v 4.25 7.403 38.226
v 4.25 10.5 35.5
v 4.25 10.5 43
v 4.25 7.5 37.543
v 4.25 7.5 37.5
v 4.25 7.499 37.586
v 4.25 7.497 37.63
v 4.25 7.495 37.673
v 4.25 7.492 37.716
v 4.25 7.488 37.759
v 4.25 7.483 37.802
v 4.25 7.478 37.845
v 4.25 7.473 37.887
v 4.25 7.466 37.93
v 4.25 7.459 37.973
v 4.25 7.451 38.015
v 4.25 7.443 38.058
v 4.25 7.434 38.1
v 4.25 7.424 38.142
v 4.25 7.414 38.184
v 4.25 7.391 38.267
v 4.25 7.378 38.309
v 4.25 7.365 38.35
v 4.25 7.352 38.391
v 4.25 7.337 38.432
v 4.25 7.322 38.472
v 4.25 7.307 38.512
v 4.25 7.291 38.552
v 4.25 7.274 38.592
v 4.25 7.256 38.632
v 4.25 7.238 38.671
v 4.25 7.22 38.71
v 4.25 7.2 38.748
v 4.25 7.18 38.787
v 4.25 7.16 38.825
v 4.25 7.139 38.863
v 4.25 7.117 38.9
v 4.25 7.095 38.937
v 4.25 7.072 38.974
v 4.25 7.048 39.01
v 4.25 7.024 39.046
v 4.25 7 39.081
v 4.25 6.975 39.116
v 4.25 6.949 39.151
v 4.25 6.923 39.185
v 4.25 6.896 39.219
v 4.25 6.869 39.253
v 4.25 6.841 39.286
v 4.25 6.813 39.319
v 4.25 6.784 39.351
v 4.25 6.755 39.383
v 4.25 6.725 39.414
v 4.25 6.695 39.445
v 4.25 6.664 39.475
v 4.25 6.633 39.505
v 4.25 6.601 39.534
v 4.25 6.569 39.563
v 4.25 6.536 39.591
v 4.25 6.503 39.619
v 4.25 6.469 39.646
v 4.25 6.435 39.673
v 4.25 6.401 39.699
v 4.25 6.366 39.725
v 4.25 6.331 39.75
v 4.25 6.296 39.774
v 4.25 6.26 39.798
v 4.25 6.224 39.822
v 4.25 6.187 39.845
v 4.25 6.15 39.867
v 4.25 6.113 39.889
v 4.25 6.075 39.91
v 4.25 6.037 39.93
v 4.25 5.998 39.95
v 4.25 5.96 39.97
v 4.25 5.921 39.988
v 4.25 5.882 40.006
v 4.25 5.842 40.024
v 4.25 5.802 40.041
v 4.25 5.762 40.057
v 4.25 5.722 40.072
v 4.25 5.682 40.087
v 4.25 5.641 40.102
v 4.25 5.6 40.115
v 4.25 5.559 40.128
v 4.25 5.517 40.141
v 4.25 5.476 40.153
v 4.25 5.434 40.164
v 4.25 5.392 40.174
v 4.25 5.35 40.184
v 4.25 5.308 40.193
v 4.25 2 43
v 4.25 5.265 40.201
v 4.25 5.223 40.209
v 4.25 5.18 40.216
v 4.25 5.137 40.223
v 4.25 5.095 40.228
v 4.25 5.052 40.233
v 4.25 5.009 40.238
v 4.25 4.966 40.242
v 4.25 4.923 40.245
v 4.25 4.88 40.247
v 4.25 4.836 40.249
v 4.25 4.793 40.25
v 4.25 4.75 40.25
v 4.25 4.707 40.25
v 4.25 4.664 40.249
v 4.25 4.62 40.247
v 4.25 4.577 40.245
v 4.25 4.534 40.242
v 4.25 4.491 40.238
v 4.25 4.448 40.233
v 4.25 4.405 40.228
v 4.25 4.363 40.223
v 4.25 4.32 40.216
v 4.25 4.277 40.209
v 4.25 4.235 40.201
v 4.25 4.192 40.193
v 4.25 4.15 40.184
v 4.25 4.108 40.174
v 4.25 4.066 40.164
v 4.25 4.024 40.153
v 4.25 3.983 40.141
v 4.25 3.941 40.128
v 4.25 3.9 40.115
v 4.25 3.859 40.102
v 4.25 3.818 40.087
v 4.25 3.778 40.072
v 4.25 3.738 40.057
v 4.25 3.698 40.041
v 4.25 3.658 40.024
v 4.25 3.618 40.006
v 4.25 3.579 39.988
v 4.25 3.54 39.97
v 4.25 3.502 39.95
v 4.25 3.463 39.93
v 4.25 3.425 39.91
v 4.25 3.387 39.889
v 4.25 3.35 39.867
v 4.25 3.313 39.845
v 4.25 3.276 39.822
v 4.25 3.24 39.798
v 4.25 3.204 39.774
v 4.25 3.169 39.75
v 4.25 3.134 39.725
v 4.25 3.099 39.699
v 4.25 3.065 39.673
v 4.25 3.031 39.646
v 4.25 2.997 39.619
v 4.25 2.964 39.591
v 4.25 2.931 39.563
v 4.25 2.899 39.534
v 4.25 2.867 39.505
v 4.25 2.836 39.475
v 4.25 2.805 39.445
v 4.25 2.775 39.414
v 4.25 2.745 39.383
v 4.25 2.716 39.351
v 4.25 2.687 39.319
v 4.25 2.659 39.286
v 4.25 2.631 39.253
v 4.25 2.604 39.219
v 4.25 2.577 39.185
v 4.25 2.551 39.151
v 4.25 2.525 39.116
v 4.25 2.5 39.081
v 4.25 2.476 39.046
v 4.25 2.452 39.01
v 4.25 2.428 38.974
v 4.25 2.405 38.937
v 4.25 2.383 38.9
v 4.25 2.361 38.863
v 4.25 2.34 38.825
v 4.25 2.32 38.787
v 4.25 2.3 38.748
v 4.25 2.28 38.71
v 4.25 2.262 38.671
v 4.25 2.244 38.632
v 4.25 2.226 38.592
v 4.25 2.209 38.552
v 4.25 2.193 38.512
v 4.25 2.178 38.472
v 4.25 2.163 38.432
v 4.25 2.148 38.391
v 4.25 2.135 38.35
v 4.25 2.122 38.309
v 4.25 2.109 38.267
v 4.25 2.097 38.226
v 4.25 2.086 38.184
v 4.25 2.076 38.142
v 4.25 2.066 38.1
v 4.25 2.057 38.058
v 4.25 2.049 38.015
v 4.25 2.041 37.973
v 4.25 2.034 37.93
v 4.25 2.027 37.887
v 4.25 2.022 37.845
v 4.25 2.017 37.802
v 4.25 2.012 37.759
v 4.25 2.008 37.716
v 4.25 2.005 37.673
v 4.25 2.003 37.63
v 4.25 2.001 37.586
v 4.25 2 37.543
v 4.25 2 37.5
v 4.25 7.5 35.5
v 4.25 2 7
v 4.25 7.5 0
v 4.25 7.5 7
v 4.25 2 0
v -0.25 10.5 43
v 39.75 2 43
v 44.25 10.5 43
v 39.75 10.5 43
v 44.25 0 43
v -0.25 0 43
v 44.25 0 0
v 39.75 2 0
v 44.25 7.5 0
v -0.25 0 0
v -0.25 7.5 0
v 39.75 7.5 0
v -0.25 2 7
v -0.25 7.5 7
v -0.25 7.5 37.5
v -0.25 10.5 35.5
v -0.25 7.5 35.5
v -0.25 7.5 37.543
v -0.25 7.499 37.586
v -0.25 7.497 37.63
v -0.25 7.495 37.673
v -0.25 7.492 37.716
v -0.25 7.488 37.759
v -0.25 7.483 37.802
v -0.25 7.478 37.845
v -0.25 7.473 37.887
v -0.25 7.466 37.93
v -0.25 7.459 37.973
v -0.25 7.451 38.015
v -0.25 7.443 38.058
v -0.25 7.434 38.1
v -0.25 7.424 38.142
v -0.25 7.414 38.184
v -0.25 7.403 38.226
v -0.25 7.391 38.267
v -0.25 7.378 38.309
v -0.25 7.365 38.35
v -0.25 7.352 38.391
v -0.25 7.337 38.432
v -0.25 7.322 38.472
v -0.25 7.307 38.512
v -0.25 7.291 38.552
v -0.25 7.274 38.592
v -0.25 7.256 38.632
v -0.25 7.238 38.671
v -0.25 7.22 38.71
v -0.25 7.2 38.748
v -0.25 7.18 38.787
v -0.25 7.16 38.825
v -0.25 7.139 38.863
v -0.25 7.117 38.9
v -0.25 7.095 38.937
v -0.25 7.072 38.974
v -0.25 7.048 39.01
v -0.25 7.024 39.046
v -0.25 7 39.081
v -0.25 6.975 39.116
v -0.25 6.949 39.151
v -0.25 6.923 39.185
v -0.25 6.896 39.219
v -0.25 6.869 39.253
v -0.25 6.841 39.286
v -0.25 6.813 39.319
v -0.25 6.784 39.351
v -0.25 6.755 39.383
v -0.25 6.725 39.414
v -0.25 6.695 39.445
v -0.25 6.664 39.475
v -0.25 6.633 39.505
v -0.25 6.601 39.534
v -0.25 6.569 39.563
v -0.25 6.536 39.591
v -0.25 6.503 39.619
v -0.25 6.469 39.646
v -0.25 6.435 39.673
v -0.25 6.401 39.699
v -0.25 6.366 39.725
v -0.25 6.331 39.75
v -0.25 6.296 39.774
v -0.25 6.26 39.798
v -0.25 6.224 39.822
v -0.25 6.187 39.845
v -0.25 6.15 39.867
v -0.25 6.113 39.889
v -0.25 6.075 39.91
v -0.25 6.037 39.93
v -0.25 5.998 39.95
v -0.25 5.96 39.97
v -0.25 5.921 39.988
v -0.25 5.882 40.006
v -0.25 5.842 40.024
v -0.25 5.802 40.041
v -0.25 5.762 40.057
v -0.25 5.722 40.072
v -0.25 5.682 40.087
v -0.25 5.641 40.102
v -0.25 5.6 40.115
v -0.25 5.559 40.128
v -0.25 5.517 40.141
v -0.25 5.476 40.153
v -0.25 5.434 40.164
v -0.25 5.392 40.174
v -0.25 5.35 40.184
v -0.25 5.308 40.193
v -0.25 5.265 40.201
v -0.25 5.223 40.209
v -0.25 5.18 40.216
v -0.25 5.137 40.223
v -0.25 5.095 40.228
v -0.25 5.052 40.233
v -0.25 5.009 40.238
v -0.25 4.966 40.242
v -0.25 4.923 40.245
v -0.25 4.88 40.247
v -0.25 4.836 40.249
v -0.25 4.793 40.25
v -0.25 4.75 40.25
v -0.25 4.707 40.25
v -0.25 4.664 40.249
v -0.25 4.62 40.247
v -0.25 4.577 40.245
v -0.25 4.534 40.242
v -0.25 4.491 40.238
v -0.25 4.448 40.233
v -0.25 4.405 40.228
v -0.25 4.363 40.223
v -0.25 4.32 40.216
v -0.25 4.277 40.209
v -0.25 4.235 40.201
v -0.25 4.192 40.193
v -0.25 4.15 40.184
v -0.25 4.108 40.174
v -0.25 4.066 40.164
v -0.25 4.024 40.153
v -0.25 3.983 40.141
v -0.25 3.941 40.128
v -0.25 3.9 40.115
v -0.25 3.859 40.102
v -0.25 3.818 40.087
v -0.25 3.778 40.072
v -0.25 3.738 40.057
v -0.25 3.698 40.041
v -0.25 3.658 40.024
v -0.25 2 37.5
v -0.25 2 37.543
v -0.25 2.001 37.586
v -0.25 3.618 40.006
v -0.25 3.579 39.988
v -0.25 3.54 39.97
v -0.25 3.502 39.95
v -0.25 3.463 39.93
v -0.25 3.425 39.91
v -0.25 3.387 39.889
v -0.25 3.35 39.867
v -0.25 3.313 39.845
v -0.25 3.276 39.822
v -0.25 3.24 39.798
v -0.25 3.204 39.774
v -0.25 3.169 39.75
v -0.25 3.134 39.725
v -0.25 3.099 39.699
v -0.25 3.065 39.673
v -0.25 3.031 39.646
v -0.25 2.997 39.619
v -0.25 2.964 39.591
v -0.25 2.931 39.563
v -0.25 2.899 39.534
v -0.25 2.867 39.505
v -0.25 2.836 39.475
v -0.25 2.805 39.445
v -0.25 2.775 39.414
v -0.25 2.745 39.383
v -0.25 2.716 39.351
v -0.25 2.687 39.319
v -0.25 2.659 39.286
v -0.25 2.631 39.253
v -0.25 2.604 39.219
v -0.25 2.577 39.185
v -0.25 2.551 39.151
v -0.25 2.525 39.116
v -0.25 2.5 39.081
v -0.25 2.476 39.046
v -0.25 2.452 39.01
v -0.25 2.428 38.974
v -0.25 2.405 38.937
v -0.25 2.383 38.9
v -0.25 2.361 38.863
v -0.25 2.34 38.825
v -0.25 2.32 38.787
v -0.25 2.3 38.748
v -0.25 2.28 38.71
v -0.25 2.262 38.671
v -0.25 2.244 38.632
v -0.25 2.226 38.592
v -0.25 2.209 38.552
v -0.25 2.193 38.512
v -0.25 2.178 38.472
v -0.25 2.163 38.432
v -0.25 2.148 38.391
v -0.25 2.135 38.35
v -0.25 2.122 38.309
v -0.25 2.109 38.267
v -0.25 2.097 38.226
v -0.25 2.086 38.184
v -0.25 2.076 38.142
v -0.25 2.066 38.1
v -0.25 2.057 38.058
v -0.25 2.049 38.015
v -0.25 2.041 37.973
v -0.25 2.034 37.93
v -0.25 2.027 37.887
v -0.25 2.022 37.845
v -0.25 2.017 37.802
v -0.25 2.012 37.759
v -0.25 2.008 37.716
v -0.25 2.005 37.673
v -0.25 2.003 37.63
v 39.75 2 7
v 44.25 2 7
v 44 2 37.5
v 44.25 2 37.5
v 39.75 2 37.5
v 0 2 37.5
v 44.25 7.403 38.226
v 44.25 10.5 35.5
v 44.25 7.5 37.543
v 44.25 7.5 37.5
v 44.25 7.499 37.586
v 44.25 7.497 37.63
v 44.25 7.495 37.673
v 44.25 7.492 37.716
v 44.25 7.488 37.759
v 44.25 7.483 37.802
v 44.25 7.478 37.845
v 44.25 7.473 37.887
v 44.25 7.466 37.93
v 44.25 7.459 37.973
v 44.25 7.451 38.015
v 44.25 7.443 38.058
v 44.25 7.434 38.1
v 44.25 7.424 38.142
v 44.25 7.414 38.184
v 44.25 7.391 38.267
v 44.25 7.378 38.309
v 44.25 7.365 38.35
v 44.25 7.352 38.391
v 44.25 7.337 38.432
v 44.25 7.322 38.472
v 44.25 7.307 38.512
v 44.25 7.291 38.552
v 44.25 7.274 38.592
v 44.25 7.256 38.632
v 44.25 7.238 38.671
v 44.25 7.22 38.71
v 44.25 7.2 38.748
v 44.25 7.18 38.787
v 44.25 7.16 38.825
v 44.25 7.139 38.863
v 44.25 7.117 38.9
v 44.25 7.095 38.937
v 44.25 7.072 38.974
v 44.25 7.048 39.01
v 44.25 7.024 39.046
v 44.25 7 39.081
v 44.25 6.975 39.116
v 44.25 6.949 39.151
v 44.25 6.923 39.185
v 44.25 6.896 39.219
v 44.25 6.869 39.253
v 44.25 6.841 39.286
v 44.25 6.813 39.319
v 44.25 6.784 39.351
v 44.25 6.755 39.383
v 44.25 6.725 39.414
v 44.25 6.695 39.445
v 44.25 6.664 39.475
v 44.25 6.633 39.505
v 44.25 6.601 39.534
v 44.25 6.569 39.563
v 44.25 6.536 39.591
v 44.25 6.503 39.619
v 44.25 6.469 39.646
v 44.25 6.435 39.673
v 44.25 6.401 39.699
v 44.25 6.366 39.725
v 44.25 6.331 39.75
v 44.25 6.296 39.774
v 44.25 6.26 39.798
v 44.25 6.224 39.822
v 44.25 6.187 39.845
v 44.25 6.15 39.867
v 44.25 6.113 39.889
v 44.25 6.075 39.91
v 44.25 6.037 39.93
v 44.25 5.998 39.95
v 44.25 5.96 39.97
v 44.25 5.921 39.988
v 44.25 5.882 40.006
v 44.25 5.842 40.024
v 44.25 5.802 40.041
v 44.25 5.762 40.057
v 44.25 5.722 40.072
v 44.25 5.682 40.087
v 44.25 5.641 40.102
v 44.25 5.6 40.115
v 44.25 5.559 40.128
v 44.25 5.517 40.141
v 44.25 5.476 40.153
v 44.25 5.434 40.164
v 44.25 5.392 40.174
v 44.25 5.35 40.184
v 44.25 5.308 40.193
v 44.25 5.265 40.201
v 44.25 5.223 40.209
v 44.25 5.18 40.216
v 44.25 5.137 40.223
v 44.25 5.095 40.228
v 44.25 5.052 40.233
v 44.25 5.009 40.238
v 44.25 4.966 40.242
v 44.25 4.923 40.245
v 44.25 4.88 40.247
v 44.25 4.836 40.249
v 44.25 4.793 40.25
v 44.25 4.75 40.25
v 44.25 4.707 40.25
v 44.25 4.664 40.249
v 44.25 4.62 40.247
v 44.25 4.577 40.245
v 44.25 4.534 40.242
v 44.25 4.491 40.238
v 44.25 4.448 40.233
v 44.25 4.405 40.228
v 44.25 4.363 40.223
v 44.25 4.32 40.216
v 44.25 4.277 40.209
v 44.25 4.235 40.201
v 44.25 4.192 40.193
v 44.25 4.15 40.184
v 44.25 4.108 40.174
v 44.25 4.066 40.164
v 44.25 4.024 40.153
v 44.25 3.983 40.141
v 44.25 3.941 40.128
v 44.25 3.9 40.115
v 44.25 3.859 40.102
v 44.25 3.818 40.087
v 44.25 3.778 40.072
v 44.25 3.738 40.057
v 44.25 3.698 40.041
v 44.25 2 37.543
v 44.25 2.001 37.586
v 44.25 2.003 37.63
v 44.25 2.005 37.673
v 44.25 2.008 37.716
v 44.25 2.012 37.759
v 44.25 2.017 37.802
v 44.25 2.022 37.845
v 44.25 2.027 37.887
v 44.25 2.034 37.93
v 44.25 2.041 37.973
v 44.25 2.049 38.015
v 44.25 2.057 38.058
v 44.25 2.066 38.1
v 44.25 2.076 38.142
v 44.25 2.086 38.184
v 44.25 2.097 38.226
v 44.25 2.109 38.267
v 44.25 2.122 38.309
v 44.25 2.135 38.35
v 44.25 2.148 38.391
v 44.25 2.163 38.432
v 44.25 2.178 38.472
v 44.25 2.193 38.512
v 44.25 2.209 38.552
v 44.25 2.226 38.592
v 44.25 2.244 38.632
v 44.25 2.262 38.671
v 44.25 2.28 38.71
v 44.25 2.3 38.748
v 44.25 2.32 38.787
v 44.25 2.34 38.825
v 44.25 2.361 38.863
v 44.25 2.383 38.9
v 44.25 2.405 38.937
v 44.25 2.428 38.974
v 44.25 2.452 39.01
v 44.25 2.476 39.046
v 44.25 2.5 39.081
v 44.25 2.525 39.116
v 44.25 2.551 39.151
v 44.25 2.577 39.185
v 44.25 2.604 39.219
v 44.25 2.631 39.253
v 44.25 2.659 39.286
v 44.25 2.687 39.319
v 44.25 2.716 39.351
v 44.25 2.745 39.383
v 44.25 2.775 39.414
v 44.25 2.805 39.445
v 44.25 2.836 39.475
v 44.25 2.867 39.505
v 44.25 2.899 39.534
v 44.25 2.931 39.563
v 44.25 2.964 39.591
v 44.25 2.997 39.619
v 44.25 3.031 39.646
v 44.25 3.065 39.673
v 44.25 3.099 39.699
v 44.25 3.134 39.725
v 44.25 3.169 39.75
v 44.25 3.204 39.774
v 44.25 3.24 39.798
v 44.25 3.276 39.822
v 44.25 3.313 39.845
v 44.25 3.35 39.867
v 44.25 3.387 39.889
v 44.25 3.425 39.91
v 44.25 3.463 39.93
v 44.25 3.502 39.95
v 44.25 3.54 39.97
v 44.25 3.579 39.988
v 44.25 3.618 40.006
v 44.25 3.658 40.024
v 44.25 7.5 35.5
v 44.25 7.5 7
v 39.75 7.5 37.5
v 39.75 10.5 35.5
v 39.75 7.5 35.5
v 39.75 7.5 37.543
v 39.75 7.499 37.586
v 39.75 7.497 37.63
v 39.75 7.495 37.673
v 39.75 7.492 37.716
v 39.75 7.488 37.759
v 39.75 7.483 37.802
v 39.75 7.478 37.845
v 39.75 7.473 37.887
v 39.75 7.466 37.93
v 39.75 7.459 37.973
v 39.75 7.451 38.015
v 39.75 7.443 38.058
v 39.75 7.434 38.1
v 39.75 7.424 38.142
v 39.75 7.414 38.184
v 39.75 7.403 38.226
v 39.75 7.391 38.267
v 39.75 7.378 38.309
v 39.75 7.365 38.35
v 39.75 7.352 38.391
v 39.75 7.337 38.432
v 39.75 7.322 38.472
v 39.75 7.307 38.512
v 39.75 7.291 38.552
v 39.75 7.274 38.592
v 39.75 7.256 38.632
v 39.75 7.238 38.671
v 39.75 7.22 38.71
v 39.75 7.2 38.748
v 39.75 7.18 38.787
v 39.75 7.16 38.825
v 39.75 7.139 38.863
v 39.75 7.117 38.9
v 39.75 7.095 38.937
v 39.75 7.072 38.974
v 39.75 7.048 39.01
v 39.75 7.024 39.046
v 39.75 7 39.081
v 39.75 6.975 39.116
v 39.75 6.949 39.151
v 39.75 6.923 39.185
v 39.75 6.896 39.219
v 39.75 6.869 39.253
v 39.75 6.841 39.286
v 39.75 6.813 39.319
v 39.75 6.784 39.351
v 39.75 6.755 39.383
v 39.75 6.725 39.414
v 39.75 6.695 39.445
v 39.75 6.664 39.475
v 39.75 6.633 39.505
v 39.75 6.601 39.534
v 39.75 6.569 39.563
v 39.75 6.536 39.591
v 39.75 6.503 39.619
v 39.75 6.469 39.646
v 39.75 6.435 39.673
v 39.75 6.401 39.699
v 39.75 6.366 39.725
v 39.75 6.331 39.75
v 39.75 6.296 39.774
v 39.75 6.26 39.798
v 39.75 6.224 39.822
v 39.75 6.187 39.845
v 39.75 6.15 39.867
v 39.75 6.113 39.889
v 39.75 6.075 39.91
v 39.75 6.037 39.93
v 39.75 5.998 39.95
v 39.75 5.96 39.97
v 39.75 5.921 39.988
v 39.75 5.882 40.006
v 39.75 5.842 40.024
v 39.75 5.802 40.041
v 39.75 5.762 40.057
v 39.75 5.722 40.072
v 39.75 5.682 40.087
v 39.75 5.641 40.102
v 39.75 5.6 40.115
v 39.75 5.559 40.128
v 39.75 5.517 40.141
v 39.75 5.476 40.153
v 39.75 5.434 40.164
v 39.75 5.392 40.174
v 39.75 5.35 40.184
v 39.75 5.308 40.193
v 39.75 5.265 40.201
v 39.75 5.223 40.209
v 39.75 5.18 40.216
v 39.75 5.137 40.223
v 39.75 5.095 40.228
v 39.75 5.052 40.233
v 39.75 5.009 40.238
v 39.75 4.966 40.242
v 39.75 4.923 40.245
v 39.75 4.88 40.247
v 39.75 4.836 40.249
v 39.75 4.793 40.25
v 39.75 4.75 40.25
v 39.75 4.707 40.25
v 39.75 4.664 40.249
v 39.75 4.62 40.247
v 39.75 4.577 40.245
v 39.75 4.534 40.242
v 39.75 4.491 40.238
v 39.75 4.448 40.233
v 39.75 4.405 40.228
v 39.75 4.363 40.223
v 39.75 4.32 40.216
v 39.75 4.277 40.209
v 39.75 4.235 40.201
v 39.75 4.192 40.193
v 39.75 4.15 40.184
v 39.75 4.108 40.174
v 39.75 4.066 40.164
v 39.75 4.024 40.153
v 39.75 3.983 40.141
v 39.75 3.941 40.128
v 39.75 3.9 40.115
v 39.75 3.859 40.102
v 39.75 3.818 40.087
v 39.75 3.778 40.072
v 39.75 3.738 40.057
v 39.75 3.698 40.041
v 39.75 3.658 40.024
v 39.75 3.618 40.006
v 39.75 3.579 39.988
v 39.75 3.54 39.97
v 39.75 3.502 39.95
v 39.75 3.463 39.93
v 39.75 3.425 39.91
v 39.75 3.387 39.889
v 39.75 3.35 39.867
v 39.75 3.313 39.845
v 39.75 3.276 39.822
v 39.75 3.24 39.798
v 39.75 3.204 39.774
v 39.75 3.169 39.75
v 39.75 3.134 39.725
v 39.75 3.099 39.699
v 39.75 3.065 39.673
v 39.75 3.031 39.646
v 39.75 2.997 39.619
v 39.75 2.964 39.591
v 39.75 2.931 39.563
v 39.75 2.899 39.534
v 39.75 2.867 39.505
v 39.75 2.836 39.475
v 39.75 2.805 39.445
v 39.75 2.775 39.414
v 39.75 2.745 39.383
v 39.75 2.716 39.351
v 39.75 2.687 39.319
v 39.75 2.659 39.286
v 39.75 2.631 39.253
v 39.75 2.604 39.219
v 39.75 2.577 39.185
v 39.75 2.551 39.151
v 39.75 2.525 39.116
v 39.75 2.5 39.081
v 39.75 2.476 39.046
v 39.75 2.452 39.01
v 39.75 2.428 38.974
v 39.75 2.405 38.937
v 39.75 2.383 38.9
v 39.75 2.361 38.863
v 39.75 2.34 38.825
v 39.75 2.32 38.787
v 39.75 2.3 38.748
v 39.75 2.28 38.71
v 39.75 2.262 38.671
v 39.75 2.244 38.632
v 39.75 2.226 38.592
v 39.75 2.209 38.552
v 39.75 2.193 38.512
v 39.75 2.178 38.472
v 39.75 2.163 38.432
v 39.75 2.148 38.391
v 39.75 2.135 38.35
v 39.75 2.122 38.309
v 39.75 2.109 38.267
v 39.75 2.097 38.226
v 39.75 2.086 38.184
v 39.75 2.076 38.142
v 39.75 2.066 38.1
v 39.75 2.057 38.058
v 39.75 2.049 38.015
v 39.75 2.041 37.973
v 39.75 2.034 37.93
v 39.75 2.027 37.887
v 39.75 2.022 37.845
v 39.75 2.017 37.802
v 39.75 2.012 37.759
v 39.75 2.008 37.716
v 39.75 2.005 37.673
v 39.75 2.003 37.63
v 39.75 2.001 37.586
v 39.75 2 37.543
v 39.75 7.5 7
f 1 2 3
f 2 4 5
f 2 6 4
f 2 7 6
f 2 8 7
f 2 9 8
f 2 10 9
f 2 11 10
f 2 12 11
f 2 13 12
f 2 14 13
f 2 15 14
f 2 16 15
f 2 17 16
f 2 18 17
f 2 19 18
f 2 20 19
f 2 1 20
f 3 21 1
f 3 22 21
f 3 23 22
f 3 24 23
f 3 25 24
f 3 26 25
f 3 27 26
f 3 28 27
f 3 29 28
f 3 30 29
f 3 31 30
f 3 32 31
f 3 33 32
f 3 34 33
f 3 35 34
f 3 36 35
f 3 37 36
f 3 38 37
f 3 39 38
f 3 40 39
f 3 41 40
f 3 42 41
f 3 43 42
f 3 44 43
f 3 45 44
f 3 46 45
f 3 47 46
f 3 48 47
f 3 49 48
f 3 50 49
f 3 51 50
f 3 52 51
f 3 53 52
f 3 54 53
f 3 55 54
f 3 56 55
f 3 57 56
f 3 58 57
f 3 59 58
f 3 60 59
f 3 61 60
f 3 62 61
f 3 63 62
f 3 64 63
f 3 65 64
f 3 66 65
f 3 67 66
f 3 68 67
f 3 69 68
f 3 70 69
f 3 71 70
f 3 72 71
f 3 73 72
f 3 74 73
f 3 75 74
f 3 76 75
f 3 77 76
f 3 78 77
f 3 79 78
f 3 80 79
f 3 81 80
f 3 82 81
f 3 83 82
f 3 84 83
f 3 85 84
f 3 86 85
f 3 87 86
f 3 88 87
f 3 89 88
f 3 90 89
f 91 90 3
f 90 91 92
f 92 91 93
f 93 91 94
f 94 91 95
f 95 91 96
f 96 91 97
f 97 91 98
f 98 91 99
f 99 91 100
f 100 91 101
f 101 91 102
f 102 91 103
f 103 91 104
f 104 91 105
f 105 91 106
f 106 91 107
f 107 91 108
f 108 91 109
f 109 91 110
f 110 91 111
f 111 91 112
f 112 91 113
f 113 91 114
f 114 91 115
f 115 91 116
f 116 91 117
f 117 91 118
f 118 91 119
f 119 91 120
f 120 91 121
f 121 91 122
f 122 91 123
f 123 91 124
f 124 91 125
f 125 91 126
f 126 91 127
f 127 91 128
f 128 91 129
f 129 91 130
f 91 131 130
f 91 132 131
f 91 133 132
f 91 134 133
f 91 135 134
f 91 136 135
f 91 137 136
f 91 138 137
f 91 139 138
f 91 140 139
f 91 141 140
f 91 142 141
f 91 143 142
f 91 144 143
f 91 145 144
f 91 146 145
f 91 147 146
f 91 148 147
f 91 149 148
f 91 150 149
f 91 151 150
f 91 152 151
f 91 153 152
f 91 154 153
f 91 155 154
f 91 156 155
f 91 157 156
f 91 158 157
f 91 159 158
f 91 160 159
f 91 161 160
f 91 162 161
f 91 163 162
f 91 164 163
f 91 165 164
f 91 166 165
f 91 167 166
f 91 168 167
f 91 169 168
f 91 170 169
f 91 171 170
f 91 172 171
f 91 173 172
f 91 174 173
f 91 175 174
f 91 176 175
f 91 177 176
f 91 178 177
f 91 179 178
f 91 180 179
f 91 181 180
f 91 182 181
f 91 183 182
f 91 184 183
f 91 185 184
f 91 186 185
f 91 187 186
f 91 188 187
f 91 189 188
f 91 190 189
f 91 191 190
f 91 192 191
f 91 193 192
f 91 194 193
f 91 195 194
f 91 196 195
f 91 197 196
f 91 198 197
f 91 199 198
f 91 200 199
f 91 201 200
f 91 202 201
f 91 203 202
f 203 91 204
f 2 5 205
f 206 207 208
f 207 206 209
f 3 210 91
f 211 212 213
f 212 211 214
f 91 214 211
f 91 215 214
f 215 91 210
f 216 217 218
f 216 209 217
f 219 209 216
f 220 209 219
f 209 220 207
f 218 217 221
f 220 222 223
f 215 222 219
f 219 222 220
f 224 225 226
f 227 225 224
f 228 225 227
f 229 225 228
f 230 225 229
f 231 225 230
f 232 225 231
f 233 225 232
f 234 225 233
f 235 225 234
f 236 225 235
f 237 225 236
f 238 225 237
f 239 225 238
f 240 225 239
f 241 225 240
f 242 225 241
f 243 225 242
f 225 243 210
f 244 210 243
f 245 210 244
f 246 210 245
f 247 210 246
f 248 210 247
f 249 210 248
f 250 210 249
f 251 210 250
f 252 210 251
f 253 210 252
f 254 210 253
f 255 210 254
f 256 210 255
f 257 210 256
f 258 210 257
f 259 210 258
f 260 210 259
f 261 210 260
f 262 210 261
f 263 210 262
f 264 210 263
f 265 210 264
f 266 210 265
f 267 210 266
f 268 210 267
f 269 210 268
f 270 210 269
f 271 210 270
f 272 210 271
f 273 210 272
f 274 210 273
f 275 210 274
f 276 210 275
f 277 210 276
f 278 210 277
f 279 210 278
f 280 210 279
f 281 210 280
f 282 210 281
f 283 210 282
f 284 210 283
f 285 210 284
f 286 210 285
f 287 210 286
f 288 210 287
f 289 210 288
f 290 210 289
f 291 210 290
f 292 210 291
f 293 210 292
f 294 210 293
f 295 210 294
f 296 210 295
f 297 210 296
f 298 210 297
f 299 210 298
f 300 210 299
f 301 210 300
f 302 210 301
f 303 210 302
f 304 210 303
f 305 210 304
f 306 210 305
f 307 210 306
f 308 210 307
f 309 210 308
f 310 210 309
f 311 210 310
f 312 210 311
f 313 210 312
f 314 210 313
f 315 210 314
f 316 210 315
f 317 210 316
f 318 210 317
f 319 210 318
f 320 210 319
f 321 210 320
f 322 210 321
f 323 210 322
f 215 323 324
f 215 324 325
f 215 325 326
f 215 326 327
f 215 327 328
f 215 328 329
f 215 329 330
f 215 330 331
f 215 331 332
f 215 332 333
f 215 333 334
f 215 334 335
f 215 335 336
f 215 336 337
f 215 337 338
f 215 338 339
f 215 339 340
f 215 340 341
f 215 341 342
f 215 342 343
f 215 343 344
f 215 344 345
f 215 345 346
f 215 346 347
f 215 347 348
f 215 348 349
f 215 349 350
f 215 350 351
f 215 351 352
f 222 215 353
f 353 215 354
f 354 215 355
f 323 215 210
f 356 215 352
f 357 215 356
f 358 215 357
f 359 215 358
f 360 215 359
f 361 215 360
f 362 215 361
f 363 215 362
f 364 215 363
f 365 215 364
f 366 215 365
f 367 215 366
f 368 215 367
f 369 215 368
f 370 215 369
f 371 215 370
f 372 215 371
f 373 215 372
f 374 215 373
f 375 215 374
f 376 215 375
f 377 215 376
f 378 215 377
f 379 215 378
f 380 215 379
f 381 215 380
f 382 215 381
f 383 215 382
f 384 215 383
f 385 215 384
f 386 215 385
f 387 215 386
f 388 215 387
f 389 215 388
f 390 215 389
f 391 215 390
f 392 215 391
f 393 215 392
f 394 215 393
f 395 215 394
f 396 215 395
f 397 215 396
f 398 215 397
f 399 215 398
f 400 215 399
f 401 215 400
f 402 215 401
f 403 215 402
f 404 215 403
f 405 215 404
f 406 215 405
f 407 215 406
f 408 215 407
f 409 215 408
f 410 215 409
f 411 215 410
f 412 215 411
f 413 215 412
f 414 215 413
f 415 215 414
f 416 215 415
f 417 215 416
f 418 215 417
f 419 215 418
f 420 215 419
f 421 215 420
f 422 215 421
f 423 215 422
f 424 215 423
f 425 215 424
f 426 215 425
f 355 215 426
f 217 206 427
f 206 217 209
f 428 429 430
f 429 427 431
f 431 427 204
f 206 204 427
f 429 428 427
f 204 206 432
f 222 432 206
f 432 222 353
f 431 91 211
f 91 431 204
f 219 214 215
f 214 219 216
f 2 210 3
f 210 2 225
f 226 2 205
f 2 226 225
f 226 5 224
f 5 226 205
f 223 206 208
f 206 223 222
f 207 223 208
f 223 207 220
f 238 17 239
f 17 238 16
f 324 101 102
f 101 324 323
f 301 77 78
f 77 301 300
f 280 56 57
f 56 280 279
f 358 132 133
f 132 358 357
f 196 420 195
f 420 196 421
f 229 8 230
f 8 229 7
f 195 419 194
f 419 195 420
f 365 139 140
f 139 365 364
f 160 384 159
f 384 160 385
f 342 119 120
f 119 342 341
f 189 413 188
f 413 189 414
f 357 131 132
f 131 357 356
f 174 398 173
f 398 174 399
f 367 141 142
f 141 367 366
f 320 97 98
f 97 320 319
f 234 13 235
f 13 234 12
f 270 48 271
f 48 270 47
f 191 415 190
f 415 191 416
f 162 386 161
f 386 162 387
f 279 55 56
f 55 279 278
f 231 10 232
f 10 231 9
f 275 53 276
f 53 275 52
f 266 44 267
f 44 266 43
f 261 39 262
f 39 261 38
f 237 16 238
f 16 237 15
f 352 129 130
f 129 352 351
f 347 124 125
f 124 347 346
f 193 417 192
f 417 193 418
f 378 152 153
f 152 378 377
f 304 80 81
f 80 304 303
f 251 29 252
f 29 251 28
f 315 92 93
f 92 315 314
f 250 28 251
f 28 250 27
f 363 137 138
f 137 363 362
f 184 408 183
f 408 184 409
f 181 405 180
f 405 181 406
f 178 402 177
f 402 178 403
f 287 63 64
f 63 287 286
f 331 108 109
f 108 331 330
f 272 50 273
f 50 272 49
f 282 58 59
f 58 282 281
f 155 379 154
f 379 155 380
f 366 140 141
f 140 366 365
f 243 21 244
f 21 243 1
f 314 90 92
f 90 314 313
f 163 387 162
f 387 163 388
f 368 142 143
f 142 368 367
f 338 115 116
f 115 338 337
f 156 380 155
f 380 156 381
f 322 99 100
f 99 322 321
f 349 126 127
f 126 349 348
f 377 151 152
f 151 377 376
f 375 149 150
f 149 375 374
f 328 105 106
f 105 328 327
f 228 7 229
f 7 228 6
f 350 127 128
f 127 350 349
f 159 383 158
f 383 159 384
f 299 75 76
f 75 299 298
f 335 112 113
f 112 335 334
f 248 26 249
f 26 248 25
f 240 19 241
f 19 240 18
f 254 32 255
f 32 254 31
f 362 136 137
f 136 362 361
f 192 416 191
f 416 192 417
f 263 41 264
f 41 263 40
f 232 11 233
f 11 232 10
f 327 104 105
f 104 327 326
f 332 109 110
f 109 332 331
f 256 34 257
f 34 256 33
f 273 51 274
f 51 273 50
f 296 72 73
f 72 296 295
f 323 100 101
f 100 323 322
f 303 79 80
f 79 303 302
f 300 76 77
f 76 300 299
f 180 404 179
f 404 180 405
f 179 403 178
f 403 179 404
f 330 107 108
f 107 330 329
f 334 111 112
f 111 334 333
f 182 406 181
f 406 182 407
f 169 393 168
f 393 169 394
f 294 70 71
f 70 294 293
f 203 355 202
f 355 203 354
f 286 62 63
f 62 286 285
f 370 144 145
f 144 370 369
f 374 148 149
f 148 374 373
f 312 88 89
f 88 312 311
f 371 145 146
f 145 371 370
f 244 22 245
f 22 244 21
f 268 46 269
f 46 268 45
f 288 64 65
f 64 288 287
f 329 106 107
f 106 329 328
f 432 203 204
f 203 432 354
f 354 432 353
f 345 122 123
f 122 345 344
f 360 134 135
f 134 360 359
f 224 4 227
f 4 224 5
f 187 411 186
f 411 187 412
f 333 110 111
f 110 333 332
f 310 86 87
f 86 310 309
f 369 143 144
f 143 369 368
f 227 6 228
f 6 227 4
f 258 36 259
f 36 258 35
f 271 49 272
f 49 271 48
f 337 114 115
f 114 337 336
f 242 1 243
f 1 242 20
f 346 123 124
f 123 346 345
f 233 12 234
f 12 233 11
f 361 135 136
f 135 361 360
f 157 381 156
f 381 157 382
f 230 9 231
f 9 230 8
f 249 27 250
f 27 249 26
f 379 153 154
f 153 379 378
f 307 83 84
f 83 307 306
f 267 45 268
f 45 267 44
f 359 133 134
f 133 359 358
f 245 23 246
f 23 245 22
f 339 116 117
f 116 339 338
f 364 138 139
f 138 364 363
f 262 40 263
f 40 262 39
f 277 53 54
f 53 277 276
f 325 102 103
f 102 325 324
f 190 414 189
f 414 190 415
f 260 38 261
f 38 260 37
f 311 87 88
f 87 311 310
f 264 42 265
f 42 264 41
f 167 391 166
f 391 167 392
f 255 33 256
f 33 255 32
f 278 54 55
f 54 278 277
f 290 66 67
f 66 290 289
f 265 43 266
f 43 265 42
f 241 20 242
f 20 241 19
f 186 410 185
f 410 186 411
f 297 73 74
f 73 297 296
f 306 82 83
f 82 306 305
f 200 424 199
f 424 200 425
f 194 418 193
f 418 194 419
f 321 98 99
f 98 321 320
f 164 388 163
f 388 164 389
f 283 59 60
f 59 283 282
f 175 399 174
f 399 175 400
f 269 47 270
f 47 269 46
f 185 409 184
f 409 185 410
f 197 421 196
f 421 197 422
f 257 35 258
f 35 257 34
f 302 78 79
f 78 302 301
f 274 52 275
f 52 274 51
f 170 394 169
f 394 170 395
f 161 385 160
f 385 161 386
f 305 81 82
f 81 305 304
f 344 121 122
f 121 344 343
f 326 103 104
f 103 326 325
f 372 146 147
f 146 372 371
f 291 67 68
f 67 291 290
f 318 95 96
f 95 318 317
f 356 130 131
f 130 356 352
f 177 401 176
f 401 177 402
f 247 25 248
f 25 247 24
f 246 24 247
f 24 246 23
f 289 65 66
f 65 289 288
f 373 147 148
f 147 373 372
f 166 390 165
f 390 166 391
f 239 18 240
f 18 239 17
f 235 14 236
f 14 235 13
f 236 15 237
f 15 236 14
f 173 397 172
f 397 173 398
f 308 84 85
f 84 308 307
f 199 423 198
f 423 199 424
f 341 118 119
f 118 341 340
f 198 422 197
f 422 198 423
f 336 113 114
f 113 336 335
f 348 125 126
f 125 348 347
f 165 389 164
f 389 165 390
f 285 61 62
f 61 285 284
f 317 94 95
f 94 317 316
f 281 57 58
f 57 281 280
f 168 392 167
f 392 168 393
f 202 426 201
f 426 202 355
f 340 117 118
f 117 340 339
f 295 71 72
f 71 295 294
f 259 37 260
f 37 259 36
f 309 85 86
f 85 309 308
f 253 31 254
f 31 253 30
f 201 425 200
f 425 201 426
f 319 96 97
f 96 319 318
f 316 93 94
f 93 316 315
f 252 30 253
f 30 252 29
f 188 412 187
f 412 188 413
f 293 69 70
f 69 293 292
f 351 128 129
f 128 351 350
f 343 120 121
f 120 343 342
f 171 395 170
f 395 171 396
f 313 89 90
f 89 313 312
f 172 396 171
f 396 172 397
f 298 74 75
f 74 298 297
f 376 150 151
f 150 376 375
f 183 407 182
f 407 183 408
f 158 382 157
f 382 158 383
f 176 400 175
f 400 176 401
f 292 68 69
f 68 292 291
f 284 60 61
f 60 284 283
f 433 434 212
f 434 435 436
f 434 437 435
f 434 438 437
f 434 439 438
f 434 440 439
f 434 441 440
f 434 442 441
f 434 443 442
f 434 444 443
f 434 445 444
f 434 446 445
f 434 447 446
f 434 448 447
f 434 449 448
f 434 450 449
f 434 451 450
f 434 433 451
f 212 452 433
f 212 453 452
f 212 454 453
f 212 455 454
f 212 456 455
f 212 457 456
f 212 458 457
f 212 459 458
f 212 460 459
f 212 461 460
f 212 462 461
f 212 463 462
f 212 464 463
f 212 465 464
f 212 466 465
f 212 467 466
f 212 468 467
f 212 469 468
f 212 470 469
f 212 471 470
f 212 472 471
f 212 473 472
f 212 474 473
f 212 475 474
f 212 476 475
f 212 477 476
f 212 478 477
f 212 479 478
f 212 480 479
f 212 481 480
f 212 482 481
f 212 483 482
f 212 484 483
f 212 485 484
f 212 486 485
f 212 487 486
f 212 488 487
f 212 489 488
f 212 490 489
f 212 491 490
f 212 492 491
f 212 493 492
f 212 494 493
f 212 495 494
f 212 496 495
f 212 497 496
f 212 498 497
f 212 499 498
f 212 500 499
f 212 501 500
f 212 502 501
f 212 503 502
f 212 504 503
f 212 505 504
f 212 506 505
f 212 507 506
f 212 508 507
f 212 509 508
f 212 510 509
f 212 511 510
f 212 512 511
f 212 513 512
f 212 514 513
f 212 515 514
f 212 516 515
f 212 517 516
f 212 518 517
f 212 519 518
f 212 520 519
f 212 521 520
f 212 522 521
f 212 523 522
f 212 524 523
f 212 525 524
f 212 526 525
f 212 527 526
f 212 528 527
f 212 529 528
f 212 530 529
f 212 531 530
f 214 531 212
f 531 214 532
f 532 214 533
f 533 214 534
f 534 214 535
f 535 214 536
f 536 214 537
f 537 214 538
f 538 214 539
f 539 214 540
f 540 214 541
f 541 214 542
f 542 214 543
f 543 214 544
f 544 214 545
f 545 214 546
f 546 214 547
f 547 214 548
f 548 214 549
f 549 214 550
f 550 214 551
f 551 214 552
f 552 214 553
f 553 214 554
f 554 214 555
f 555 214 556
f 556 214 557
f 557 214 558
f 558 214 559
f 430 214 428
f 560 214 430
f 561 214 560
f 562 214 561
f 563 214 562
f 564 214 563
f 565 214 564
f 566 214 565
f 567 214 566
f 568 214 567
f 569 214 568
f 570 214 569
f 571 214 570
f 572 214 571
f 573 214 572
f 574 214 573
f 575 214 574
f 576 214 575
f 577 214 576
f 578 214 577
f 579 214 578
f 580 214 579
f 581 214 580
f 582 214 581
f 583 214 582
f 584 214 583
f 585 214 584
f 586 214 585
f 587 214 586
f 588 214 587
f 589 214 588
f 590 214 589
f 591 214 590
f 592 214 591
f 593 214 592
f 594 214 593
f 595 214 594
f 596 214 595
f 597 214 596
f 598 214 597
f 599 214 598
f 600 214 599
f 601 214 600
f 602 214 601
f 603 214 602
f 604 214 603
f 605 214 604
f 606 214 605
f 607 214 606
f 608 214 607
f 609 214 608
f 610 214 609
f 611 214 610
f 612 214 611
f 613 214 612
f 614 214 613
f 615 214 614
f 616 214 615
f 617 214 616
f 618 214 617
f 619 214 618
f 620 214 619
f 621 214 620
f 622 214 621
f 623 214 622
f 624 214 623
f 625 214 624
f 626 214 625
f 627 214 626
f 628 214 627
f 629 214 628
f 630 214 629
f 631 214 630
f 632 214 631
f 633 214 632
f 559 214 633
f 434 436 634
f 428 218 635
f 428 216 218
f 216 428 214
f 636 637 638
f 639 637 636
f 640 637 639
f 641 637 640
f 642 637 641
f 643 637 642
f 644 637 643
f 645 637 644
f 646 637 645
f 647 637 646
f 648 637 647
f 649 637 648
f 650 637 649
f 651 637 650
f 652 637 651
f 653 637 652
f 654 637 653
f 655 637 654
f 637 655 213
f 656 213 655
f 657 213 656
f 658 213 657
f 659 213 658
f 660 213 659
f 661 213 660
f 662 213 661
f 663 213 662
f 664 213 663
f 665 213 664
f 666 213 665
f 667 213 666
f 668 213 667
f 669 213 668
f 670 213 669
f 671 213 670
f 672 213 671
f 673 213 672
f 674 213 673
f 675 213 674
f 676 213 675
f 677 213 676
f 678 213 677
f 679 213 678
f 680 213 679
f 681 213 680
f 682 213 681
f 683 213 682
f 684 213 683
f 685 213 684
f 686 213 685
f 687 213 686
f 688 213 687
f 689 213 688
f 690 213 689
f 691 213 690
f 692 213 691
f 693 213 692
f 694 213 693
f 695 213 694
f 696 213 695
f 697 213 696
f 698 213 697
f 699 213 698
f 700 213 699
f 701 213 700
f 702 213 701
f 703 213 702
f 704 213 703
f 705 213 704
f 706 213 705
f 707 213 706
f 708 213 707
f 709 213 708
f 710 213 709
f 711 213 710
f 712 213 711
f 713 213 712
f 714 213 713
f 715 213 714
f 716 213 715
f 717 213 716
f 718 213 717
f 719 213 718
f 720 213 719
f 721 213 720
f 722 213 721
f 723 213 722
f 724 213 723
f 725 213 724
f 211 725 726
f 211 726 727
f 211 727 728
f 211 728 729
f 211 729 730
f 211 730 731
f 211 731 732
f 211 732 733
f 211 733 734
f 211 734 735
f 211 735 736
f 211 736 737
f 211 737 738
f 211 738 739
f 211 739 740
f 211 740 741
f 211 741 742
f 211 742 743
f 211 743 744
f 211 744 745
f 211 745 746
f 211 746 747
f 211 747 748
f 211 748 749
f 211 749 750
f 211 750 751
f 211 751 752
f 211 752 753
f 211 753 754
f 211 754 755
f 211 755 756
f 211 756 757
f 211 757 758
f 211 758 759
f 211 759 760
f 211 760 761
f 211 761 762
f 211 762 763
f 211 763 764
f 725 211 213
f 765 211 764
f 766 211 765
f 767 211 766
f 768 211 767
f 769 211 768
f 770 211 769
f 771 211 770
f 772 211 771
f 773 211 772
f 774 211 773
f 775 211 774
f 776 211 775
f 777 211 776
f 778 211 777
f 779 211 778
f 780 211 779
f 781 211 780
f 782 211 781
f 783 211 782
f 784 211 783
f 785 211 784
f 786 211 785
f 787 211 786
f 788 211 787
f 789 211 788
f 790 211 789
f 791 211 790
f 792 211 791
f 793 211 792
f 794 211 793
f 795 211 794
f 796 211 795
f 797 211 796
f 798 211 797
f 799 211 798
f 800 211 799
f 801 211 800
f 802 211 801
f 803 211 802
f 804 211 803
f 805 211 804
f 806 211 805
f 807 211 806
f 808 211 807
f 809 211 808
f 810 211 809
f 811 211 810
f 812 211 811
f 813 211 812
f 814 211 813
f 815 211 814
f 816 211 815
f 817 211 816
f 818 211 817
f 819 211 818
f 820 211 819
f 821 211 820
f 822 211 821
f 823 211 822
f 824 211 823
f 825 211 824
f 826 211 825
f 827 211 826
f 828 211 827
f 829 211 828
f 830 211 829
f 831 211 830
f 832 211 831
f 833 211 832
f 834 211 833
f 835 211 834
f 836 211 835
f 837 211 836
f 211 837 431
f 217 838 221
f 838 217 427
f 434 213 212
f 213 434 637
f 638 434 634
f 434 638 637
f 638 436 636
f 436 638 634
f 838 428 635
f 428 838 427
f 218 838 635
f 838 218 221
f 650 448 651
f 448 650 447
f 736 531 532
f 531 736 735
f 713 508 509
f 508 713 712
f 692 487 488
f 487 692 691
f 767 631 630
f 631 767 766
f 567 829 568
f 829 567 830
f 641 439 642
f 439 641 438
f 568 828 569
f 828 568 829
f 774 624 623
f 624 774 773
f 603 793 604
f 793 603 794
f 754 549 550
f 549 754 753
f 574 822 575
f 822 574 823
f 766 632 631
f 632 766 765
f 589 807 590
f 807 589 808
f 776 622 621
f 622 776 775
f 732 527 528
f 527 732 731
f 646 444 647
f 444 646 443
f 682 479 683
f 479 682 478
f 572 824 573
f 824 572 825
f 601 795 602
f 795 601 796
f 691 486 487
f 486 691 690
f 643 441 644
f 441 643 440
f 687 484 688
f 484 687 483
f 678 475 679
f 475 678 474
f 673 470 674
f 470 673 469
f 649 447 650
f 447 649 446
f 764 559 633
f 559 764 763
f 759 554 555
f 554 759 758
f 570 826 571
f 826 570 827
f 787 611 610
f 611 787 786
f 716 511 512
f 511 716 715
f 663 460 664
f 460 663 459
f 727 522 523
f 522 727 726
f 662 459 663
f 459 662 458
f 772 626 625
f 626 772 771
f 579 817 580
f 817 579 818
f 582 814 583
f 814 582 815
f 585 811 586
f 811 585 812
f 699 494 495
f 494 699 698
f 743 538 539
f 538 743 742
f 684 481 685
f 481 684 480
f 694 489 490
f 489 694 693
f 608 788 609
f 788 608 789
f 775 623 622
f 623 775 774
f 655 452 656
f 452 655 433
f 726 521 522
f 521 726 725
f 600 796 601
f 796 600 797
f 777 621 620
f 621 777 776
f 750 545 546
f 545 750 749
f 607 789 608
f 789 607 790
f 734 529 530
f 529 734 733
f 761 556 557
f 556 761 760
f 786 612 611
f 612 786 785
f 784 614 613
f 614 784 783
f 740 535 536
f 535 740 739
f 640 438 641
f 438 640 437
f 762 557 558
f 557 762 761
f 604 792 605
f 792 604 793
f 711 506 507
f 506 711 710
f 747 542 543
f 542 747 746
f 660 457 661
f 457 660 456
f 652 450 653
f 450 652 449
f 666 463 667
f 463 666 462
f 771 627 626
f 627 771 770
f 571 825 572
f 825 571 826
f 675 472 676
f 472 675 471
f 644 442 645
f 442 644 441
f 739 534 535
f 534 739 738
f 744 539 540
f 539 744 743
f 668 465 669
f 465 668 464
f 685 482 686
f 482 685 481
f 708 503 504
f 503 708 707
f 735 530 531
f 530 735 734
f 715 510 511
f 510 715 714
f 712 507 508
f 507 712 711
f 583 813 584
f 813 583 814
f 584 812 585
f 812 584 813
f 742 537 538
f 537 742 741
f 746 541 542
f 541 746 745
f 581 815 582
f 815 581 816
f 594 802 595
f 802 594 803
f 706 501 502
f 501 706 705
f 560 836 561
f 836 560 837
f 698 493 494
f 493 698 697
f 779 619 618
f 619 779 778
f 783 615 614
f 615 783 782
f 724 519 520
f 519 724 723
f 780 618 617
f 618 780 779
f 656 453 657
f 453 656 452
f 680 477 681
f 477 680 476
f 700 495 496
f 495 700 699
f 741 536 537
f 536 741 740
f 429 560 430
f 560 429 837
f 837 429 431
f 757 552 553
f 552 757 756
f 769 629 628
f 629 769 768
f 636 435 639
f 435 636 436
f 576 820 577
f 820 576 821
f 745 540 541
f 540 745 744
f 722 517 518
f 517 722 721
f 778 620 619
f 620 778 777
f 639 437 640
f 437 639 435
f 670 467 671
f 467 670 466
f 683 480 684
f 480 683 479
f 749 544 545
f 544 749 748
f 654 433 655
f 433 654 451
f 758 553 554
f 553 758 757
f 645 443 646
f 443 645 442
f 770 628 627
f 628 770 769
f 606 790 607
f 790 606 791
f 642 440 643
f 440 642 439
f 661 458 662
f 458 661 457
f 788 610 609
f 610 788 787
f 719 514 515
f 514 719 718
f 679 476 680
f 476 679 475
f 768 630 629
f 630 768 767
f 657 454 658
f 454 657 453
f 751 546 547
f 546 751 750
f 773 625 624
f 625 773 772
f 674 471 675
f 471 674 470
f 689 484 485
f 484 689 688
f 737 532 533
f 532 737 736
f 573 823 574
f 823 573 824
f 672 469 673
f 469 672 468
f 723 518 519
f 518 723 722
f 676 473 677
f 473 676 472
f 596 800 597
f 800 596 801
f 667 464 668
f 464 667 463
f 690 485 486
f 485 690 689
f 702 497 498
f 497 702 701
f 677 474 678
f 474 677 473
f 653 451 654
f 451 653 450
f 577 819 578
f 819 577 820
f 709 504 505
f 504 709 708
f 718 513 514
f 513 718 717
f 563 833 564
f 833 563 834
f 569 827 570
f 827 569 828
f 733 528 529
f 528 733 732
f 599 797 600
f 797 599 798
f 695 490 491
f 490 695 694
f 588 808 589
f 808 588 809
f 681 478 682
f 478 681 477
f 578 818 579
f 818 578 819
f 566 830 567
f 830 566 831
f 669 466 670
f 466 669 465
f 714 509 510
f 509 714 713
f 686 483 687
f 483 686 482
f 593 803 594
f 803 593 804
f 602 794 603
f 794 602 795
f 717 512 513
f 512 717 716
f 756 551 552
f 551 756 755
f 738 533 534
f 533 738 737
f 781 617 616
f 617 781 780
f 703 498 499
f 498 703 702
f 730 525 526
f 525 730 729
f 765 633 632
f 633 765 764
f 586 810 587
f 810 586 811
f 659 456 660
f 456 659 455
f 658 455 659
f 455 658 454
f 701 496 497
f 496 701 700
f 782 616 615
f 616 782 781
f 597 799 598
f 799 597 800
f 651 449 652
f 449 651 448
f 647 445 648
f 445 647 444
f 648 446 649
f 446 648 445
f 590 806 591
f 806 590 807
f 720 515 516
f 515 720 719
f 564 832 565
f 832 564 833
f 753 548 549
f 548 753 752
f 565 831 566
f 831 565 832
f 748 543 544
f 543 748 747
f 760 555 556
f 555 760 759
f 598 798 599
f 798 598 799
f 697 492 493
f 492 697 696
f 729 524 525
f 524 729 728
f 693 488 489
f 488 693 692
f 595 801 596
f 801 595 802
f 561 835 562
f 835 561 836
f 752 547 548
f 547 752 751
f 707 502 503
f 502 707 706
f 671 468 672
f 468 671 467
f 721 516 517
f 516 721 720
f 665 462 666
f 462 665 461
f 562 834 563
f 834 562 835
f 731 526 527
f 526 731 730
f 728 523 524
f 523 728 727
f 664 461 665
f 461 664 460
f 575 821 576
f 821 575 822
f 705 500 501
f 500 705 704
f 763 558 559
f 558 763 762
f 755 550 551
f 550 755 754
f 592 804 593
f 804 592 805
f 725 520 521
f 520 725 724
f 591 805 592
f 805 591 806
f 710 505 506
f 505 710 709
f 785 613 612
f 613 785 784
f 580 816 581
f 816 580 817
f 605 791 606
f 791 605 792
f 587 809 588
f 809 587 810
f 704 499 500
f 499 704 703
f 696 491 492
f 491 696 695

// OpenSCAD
// file: IKEA Skadis include holder.scad
$fn=400;

sh_height=43;
sh_width=4.5;
sh_hanger_spacing=5.5;
sh_material_size=2;
sh_short_tail=2;

module ikea_skadis_holder() {
    difference() {
        union() {
            
            //Vertical wall
            color("green")
            cube([sh_width,sh_material_size,sh_height]);
            
            // Retainer
            color("blue")
            translate([0,0,sh_height-sh_hanger_spacing])
            cube([sh_width,sh_hanger_spacing+sh_material_size*2+1,sh_hanger_spacing]);
            
            //Vertical wall (short)
            color("cyan")
            translate([0, sh_hanger_spacing+sh_material_size,sh_height-sh_short_tail-sh_hanger_spacing])
            cube([sh_width,sh_material_size+1,sh_short_tail]);

            //Schnöpsel
            color("yellow")
            translate([0, sh_material_size,0])
            cube([sh_width,sh_hanger_spacing,7]);
        }
        
        
    color("red")
    translate([-1,sh_material_size+sh_hanger_spacing/2,sh_height-sh_hanger_spacing])
    rotate([0,90,0])
    cylinder(sh_width+2, sh_hanger_spacing/2, sh_hanger_spacing/2);
        
    }
}
ikea_skadis_holder();
// main file
$fn=400;

sh_holder_thickness = 4.5;
sh_holder_height = 43;

use <./IKEA Skadis include holder.scad>

module ikea_skadis_backwall(width, height) {
    union() {

        width = width > 43  ? width : 44;

        // backwall
        cube([width,2,height]);

        if(height < sh_holder_height) {
            // holder left
            translate([width/2-sh_holder_thickness/2-20,0,0])
            ikea_skadis_holder();

            // holder right
            translate([width/2-sh_holder_thickness/2+20,0,0])
            ikea_skadis_holder();
        } else {
            // holder left
            translate([width/2-sh_holder_thickness/2-20,0,height-sh_holder_height])
            ikea_skadis_holder();

            // holder right
            translate([width/2-sh_holder_thickness/2+20,0,height-sh_holder_height])
            ikea_skadis_holder();
        }
    }
}

ikea_skadis_backwall(24,43);
